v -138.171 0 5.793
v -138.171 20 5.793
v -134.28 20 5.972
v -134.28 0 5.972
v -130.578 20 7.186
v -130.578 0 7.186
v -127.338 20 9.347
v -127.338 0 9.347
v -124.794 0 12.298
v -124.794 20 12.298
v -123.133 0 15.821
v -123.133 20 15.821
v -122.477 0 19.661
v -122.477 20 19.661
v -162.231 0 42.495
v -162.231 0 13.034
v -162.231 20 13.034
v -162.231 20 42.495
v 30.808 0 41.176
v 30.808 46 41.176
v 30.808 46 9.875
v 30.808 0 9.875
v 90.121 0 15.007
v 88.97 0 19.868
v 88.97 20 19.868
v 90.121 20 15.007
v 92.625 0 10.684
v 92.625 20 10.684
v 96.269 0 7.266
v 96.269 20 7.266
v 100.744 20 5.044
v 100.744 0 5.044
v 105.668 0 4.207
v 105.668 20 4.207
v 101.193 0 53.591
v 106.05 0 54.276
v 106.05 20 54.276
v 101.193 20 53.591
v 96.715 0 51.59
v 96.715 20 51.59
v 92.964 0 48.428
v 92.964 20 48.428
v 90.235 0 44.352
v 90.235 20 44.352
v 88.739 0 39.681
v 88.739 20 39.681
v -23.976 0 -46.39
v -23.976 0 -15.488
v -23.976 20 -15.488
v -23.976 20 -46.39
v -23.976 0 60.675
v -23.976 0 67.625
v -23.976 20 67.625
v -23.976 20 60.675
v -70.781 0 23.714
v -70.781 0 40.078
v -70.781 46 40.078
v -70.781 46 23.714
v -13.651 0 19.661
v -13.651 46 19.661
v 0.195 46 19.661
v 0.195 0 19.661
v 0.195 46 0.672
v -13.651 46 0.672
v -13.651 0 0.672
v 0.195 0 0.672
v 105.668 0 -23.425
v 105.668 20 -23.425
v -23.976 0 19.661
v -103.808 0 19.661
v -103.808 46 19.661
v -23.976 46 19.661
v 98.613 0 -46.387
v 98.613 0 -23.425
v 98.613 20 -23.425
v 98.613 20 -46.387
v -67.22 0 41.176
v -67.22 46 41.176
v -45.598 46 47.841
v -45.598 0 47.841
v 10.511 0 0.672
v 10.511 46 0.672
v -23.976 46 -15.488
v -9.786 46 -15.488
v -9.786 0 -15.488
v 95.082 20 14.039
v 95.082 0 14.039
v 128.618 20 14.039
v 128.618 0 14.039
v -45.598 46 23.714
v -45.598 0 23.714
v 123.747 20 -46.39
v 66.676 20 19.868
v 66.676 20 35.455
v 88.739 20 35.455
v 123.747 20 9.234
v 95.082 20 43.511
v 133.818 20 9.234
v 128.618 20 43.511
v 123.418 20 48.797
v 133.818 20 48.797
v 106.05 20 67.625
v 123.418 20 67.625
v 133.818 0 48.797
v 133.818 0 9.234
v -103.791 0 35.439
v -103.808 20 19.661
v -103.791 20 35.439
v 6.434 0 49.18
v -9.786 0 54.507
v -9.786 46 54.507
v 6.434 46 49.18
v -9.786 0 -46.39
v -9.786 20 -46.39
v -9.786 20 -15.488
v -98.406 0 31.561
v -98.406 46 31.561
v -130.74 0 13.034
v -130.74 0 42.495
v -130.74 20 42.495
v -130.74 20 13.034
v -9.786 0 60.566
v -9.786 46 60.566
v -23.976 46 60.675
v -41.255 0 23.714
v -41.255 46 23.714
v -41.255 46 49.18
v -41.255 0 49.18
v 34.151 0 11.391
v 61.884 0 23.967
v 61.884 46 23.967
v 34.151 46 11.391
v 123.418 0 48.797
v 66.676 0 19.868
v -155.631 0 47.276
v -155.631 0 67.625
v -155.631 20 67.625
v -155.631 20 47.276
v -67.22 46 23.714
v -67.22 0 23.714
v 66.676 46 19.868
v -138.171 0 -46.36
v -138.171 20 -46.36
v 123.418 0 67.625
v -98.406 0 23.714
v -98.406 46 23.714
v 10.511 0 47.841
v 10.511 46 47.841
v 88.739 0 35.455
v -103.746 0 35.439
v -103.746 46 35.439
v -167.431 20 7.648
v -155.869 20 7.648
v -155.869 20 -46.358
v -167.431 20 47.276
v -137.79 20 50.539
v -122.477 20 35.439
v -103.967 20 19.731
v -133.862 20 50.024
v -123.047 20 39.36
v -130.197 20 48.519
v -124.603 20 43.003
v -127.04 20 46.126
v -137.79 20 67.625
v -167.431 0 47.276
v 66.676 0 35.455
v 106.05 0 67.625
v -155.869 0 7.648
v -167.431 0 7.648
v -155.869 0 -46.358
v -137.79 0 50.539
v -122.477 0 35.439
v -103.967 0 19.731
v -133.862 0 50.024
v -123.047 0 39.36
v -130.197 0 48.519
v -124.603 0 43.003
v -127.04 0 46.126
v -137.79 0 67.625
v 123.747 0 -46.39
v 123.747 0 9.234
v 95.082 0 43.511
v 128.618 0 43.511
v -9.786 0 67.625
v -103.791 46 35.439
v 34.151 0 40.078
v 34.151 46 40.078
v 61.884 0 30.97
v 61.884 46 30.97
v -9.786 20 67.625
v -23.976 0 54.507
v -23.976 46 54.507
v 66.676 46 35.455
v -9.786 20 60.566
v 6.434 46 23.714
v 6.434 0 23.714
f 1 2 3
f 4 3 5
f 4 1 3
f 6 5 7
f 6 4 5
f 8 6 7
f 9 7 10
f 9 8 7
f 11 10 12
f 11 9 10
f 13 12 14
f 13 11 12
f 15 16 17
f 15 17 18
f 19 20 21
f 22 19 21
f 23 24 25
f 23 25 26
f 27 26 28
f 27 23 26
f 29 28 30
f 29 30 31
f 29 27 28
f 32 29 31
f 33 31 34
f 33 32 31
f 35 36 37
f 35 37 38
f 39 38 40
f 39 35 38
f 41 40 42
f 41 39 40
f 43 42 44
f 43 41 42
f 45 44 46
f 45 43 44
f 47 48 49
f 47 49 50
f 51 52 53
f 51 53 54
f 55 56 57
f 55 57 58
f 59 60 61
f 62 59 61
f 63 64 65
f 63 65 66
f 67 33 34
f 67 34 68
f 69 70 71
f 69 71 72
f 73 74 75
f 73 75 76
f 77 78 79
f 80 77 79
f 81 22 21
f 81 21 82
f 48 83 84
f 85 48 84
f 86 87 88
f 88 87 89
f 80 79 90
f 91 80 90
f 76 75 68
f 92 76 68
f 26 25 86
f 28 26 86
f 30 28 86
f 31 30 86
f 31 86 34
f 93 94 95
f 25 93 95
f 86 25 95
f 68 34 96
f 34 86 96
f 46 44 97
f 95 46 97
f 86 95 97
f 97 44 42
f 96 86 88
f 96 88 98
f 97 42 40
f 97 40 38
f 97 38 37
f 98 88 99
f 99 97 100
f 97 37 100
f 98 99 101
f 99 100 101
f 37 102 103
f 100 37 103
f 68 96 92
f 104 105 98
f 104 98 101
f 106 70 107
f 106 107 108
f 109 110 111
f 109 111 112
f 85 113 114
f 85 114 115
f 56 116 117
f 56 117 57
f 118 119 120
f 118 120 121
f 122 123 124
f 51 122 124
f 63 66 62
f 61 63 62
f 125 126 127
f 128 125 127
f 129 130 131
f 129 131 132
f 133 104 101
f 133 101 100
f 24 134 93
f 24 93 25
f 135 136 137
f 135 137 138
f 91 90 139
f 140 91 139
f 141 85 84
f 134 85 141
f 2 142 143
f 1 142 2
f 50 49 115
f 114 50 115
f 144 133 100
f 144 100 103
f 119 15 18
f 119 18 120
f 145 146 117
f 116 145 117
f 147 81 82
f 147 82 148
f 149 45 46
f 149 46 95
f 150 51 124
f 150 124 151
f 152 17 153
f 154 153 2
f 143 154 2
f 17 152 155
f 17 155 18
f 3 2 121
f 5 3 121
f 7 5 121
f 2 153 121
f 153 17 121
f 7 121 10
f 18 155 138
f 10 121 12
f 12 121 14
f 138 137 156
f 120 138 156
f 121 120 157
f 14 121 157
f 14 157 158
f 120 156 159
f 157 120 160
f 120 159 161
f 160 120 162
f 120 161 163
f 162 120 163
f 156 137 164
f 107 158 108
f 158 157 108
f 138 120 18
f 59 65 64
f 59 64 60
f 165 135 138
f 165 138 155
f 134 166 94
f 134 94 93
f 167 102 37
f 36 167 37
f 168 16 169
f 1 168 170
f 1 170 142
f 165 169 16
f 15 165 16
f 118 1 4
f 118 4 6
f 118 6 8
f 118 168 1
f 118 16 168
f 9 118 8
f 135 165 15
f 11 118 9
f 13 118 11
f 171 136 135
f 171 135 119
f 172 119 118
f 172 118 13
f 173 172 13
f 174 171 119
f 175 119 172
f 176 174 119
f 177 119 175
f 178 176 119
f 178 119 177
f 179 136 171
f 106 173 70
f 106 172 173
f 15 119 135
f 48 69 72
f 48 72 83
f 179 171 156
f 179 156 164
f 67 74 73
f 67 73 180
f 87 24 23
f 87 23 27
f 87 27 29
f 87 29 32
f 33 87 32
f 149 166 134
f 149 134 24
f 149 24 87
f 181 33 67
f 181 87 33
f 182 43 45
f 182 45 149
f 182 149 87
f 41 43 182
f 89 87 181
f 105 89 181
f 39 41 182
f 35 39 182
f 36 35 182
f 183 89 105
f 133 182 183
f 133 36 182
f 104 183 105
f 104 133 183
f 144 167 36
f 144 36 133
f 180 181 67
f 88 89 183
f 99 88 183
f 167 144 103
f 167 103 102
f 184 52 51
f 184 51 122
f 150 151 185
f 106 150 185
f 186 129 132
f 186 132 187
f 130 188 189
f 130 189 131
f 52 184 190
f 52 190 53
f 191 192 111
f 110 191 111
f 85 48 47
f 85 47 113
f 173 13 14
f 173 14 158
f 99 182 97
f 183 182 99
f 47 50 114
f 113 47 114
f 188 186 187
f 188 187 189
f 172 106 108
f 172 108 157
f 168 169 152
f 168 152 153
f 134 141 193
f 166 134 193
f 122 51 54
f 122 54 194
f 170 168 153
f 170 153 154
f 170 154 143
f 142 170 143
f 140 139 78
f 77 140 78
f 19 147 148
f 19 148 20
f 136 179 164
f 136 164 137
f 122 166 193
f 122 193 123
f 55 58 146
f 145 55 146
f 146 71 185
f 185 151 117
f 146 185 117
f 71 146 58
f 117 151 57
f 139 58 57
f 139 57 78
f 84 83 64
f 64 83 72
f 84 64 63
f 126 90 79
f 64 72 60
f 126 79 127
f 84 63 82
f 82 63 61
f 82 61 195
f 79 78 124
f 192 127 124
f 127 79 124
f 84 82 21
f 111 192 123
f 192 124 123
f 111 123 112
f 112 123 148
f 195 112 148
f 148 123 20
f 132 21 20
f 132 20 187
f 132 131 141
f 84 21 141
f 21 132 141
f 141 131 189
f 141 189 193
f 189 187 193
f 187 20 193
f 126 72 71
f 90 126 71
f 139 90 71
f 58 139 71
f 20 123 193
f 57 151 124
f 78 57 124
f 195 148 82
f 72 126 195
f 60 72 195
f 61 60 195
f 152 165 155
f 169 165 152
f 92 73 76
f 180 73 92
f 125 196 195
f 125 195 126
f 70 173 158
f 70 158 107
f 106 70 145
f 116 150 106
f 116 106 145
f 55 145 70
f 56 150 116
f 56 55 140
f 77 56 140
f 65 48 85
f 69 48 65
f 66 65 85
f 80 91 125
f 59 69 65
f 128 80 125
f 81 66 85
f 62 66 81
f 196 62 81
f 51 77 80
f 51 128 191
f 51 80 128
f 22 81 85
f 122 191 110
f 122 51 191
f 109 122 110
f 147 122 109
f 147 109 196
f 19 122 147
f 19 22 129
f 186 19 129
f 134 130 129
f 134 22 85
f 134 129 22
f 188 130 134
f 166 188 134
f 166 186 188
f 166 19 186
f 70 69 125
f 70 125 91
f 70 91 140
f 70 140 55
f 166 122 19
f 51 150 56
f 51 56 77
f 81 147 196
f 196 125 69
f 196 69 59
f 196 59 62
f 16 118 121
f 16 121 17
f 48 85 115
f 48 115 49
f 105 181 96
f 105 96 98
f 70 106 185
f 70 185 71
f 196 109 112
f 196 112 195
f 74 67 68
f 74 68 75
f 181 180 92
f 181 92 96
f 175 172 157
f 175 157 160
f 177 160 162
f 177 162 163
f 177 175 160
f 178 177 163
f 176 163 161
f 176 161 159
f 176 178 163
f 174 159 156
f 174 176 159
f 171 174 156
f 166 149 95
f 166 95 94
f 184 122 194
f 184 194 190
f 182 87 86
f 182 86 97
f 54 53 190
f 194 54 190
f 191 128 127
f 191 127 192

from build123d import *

# Parameters (mm, degrees)
F1_DEPTH = 20
F0_W     = 33.5354409566
F0_H     = 29.4713070616
F0_W_2   = 13.8462930918
F0_H_2   = 18.9892888787
F2_DEPTH = 46


# Not quite as in the source:
# - a feature names something its author has since deleted; it is built from what else it names


with BuildPart() as f1:
    # F0 (on Front) → F1 (new body)
    with BuildSketch(Plane.XZ):
        with BuildLine():
            Line((-155.6314946512, 67.6252768617), (-155.6314946512, 47.2762209197))
            Line((-155.6314946512, 47.2762209197), (-167.4313265361, 47.2762209197))
            Line((-167.4313265361, 47.2762209197), (-167.4313265361, 7.6476708777))
            Line((-167.4313265361, 7.6476708777), (-155.8691086427, 7.6476708777))
            Line((-155.8691086427, 7.6476708777), (-155.8691086427, -46.3575256138))
            Line((-155.8691086427, -46.3575256138), (-138.1710558739, -46.3595552359))
            Line((-138.1710558739, -46.3595552359), (-138.1710558739, 5.7931691183))
            ThreePointArc((-138.1710558739, 5.7931691183), (-127.3375674722, 9.3473401396), (-122.4768718044, 19.6609350621))
            Line((-122.4768718044, 19.6609350621), (-103.9673313431, 19.7311375442))
            Line((-103.9673313431, 19.7311375442), (-103.8078861008, 19.6609350621))
            Line((-103.8078861008, 19.6609350621), (-103.7908970378, 35.4393695202))
            Line((-103.7908970378, 35.4393695202), (-122.4768718044, 35.4393695202))
            ThreePointArc((-122.4768718044, 35.4393695202), (-127.0403675747, 46.1257386332), (-137.7895793309, 50.5391755124))
            Line((-137.7895793309, 50.5391755124), (-137.7895793309, 67.6252768617))
            Line((-137.7895793309, 67.6252768617), (-155.6314946512, 67.6252768617))
        make_face()
        Polygon((-154.9718528986, 42.4946472049), (-130.7401065387, 42.4946472049), (-130.7401065387, 13.0343120545), (-162.2313265361, 13.0343120545), (-162.2313265361, 35.5673134327), (-162.2313265361, 42.4946472049), align=None, mode=Mode.SUBTRACT)
    extrude(amount=-F1_DEPTH)


with BuildPart() as f1b:
    # F0 (on Front) → F1, piece 2 (new body)
    with BuildSketch(Plane.XZ):
        Polygon((-9.785844778, -15.4884296749), (-23.9759656186, -15.4884296749), (-23.9759656186, -46.3726511895), (-9.785844778, -46.3742785201), align=None)
        Polygon((-9.785844778, -46.3742785201), (-23.9759656186, -46.3726511895), (-23.9759656186, -46.3895921645), (-9.785844778, -46.3895921645), align=None)
    extrude(amount=-F1_DEPTH)


with BuildPart() as f1c:
    # F0 (on Front) → F1, piece 3 (new body)
    with BuildSketch(Plane.XZ):
        Polygon((-23.9759656186, 67.6252768617), (-23.9759656186, 60.675183593), (-9.785844778, 60.5657943495), (-9.785844778, 67.6252768617), align=None)
    extrude(amount=-F1_DEPTH)


with BuildPart() as f1d:
    # F0 (on Front) → F1, piece 4 (new body)
    with BuildSketch(Plane.XZ):
        with BuildLine():
            Line((88.7390607463, 35.4548891909), (66.6762858462, 35.4548891909))
            Line((66.6762858462, 35.4548891909), (66.6762858462, 19.8677930884))
            Line((66.6762858462, 19.8677930884), (88.9697274822, 19.8677930884))
            ThreePointArc((88.9697274822, 19.8677930884), (94.3221237474, 8.8416564285), (105.6684866268, 4.2065852498))
            Line((105.6684866268, 4.2065852498), (105.6684866268, -23.4245071926))
            Line((105.6684866268, -23.4245071926), (98.6128924986, -23.4245071926))
            Line((98.6128924986, -23.4245071926), (98.6128924986, -25.1669372239))
            Line((98.6128924986, -25.1669372239), (98.6128924986, -46.3867097448))
            Line((98.6128924986, -46.3867097448), (123.7472345797, -46.3895921645))
            Line((123.7472345797, -46.3895921645), (123.7472345797, -42.8738521096))
            Line((123.7472345797, -42.8738521096), (123.7472345797, 9.2341114881))
            Line((123.7472345797, 9.2341114881), (133.8177919388, 9.2341114881))
            Line((133.8177919388, 9.2341114881), (133.8177919388, 48.7965246565))
            Line((133.8177919388, 48.7965246565), (123.4177919388, 48.7965246565))
            Line((123.4177919388, 48.7965246565), (123.4177919388, 67.6252768617))
            Line((123.4177919388, 67.6252768617), (106.0500037662, 67.6252768617))
            Line((106.0500037662, 67.6252768617), (106.0500037662, 54.2760035917))
            ThreePointArc((106.0500037662, 54.2760035917), (94.7286096073, 50.1405055605), (88.7390607463, 39.6809829085))
            Line((88.7390607463, 39.6809829085), (88.7390607463, 35.4548891909))
        make_face()
        with Locations((111.8500714605, 28.7748654373)):
            Rectangle(F0_W, F0_H, mode=Mode.SUBTRACT)
    extrude(amount=-F1_DEPTH)


with BuildPart() as f2:
    # F0 (on Front) → F2 (new body)
    with BuildSketch(Plane.XZ):
        Polygon((-103.745634354, 35.4393695202), (-103.7908970378, 35.4393695202), (-103.8078861008, 19.6609350621), (-89.1917004483, 19.6609350621), (-23.9759656186, 19.6609350621), (-23.9759656186, -15.4884296749), (-9.785844778, -15.4884296749), (66.6762858462, 19.8677930884), (66.6762858462, 35.4548891909), (-9.785844778, 60.5657943495), (-23.9759656186, 60.675183593), align=None)
        with Locations((-6.7280486905, 10.1662906227)):
            Rectangle(F0_W_2, F0_H_2, mode=Mode.SUBTRACT)
        Polygon((-70.7811092775, 23.7144525419), (-98.4061571746, 23.7144525419), (-98.4061571746, 31.5614215695), (-70.7811092775, 40.0778087067), align=None, mode=Mode.SUBTRACT)
        Polygon((-67.2195533208, 23.7144525419), (-67.2195533208, 41.1757828876), (-45.5977594697, 47.841457015), (-45.5977594697, 23.7144525419), align=None, mode=Mode.SUBTRACT)
        Polygon((-41.2550495299, 49.1802492303), (-23.9759656186, 54.5071311424), (-9.785844778, 54.5071311424), (6.4343885435, 49.1802492303), (6.4343885435, 23.7144525419), (-41.2550495299, 23.7144525419), align=None, mode=Mode.SUBTRACT)
        Polygon((10.5109801516, 47.841457015), (30.8078050811, 41.1757828876), (30.8078050811, 9.8754427638), (10.5109801516, 0.6716461834), align=None, mode=Mode.SUBTRACT)
        Polygon((34.1511112947, 40.0778087067), (61.8842991005, 30.9699608995), (61.8842991005, 23.9673872123), (34.1511112947, 11.3914981273), align=None, mode=Mode.SUBTRACT)
    extrude(amount=-F2_DEPTH)


solid = Compound([f1.part, f1b.part, f1c.part, f1d.part, f2.part])
